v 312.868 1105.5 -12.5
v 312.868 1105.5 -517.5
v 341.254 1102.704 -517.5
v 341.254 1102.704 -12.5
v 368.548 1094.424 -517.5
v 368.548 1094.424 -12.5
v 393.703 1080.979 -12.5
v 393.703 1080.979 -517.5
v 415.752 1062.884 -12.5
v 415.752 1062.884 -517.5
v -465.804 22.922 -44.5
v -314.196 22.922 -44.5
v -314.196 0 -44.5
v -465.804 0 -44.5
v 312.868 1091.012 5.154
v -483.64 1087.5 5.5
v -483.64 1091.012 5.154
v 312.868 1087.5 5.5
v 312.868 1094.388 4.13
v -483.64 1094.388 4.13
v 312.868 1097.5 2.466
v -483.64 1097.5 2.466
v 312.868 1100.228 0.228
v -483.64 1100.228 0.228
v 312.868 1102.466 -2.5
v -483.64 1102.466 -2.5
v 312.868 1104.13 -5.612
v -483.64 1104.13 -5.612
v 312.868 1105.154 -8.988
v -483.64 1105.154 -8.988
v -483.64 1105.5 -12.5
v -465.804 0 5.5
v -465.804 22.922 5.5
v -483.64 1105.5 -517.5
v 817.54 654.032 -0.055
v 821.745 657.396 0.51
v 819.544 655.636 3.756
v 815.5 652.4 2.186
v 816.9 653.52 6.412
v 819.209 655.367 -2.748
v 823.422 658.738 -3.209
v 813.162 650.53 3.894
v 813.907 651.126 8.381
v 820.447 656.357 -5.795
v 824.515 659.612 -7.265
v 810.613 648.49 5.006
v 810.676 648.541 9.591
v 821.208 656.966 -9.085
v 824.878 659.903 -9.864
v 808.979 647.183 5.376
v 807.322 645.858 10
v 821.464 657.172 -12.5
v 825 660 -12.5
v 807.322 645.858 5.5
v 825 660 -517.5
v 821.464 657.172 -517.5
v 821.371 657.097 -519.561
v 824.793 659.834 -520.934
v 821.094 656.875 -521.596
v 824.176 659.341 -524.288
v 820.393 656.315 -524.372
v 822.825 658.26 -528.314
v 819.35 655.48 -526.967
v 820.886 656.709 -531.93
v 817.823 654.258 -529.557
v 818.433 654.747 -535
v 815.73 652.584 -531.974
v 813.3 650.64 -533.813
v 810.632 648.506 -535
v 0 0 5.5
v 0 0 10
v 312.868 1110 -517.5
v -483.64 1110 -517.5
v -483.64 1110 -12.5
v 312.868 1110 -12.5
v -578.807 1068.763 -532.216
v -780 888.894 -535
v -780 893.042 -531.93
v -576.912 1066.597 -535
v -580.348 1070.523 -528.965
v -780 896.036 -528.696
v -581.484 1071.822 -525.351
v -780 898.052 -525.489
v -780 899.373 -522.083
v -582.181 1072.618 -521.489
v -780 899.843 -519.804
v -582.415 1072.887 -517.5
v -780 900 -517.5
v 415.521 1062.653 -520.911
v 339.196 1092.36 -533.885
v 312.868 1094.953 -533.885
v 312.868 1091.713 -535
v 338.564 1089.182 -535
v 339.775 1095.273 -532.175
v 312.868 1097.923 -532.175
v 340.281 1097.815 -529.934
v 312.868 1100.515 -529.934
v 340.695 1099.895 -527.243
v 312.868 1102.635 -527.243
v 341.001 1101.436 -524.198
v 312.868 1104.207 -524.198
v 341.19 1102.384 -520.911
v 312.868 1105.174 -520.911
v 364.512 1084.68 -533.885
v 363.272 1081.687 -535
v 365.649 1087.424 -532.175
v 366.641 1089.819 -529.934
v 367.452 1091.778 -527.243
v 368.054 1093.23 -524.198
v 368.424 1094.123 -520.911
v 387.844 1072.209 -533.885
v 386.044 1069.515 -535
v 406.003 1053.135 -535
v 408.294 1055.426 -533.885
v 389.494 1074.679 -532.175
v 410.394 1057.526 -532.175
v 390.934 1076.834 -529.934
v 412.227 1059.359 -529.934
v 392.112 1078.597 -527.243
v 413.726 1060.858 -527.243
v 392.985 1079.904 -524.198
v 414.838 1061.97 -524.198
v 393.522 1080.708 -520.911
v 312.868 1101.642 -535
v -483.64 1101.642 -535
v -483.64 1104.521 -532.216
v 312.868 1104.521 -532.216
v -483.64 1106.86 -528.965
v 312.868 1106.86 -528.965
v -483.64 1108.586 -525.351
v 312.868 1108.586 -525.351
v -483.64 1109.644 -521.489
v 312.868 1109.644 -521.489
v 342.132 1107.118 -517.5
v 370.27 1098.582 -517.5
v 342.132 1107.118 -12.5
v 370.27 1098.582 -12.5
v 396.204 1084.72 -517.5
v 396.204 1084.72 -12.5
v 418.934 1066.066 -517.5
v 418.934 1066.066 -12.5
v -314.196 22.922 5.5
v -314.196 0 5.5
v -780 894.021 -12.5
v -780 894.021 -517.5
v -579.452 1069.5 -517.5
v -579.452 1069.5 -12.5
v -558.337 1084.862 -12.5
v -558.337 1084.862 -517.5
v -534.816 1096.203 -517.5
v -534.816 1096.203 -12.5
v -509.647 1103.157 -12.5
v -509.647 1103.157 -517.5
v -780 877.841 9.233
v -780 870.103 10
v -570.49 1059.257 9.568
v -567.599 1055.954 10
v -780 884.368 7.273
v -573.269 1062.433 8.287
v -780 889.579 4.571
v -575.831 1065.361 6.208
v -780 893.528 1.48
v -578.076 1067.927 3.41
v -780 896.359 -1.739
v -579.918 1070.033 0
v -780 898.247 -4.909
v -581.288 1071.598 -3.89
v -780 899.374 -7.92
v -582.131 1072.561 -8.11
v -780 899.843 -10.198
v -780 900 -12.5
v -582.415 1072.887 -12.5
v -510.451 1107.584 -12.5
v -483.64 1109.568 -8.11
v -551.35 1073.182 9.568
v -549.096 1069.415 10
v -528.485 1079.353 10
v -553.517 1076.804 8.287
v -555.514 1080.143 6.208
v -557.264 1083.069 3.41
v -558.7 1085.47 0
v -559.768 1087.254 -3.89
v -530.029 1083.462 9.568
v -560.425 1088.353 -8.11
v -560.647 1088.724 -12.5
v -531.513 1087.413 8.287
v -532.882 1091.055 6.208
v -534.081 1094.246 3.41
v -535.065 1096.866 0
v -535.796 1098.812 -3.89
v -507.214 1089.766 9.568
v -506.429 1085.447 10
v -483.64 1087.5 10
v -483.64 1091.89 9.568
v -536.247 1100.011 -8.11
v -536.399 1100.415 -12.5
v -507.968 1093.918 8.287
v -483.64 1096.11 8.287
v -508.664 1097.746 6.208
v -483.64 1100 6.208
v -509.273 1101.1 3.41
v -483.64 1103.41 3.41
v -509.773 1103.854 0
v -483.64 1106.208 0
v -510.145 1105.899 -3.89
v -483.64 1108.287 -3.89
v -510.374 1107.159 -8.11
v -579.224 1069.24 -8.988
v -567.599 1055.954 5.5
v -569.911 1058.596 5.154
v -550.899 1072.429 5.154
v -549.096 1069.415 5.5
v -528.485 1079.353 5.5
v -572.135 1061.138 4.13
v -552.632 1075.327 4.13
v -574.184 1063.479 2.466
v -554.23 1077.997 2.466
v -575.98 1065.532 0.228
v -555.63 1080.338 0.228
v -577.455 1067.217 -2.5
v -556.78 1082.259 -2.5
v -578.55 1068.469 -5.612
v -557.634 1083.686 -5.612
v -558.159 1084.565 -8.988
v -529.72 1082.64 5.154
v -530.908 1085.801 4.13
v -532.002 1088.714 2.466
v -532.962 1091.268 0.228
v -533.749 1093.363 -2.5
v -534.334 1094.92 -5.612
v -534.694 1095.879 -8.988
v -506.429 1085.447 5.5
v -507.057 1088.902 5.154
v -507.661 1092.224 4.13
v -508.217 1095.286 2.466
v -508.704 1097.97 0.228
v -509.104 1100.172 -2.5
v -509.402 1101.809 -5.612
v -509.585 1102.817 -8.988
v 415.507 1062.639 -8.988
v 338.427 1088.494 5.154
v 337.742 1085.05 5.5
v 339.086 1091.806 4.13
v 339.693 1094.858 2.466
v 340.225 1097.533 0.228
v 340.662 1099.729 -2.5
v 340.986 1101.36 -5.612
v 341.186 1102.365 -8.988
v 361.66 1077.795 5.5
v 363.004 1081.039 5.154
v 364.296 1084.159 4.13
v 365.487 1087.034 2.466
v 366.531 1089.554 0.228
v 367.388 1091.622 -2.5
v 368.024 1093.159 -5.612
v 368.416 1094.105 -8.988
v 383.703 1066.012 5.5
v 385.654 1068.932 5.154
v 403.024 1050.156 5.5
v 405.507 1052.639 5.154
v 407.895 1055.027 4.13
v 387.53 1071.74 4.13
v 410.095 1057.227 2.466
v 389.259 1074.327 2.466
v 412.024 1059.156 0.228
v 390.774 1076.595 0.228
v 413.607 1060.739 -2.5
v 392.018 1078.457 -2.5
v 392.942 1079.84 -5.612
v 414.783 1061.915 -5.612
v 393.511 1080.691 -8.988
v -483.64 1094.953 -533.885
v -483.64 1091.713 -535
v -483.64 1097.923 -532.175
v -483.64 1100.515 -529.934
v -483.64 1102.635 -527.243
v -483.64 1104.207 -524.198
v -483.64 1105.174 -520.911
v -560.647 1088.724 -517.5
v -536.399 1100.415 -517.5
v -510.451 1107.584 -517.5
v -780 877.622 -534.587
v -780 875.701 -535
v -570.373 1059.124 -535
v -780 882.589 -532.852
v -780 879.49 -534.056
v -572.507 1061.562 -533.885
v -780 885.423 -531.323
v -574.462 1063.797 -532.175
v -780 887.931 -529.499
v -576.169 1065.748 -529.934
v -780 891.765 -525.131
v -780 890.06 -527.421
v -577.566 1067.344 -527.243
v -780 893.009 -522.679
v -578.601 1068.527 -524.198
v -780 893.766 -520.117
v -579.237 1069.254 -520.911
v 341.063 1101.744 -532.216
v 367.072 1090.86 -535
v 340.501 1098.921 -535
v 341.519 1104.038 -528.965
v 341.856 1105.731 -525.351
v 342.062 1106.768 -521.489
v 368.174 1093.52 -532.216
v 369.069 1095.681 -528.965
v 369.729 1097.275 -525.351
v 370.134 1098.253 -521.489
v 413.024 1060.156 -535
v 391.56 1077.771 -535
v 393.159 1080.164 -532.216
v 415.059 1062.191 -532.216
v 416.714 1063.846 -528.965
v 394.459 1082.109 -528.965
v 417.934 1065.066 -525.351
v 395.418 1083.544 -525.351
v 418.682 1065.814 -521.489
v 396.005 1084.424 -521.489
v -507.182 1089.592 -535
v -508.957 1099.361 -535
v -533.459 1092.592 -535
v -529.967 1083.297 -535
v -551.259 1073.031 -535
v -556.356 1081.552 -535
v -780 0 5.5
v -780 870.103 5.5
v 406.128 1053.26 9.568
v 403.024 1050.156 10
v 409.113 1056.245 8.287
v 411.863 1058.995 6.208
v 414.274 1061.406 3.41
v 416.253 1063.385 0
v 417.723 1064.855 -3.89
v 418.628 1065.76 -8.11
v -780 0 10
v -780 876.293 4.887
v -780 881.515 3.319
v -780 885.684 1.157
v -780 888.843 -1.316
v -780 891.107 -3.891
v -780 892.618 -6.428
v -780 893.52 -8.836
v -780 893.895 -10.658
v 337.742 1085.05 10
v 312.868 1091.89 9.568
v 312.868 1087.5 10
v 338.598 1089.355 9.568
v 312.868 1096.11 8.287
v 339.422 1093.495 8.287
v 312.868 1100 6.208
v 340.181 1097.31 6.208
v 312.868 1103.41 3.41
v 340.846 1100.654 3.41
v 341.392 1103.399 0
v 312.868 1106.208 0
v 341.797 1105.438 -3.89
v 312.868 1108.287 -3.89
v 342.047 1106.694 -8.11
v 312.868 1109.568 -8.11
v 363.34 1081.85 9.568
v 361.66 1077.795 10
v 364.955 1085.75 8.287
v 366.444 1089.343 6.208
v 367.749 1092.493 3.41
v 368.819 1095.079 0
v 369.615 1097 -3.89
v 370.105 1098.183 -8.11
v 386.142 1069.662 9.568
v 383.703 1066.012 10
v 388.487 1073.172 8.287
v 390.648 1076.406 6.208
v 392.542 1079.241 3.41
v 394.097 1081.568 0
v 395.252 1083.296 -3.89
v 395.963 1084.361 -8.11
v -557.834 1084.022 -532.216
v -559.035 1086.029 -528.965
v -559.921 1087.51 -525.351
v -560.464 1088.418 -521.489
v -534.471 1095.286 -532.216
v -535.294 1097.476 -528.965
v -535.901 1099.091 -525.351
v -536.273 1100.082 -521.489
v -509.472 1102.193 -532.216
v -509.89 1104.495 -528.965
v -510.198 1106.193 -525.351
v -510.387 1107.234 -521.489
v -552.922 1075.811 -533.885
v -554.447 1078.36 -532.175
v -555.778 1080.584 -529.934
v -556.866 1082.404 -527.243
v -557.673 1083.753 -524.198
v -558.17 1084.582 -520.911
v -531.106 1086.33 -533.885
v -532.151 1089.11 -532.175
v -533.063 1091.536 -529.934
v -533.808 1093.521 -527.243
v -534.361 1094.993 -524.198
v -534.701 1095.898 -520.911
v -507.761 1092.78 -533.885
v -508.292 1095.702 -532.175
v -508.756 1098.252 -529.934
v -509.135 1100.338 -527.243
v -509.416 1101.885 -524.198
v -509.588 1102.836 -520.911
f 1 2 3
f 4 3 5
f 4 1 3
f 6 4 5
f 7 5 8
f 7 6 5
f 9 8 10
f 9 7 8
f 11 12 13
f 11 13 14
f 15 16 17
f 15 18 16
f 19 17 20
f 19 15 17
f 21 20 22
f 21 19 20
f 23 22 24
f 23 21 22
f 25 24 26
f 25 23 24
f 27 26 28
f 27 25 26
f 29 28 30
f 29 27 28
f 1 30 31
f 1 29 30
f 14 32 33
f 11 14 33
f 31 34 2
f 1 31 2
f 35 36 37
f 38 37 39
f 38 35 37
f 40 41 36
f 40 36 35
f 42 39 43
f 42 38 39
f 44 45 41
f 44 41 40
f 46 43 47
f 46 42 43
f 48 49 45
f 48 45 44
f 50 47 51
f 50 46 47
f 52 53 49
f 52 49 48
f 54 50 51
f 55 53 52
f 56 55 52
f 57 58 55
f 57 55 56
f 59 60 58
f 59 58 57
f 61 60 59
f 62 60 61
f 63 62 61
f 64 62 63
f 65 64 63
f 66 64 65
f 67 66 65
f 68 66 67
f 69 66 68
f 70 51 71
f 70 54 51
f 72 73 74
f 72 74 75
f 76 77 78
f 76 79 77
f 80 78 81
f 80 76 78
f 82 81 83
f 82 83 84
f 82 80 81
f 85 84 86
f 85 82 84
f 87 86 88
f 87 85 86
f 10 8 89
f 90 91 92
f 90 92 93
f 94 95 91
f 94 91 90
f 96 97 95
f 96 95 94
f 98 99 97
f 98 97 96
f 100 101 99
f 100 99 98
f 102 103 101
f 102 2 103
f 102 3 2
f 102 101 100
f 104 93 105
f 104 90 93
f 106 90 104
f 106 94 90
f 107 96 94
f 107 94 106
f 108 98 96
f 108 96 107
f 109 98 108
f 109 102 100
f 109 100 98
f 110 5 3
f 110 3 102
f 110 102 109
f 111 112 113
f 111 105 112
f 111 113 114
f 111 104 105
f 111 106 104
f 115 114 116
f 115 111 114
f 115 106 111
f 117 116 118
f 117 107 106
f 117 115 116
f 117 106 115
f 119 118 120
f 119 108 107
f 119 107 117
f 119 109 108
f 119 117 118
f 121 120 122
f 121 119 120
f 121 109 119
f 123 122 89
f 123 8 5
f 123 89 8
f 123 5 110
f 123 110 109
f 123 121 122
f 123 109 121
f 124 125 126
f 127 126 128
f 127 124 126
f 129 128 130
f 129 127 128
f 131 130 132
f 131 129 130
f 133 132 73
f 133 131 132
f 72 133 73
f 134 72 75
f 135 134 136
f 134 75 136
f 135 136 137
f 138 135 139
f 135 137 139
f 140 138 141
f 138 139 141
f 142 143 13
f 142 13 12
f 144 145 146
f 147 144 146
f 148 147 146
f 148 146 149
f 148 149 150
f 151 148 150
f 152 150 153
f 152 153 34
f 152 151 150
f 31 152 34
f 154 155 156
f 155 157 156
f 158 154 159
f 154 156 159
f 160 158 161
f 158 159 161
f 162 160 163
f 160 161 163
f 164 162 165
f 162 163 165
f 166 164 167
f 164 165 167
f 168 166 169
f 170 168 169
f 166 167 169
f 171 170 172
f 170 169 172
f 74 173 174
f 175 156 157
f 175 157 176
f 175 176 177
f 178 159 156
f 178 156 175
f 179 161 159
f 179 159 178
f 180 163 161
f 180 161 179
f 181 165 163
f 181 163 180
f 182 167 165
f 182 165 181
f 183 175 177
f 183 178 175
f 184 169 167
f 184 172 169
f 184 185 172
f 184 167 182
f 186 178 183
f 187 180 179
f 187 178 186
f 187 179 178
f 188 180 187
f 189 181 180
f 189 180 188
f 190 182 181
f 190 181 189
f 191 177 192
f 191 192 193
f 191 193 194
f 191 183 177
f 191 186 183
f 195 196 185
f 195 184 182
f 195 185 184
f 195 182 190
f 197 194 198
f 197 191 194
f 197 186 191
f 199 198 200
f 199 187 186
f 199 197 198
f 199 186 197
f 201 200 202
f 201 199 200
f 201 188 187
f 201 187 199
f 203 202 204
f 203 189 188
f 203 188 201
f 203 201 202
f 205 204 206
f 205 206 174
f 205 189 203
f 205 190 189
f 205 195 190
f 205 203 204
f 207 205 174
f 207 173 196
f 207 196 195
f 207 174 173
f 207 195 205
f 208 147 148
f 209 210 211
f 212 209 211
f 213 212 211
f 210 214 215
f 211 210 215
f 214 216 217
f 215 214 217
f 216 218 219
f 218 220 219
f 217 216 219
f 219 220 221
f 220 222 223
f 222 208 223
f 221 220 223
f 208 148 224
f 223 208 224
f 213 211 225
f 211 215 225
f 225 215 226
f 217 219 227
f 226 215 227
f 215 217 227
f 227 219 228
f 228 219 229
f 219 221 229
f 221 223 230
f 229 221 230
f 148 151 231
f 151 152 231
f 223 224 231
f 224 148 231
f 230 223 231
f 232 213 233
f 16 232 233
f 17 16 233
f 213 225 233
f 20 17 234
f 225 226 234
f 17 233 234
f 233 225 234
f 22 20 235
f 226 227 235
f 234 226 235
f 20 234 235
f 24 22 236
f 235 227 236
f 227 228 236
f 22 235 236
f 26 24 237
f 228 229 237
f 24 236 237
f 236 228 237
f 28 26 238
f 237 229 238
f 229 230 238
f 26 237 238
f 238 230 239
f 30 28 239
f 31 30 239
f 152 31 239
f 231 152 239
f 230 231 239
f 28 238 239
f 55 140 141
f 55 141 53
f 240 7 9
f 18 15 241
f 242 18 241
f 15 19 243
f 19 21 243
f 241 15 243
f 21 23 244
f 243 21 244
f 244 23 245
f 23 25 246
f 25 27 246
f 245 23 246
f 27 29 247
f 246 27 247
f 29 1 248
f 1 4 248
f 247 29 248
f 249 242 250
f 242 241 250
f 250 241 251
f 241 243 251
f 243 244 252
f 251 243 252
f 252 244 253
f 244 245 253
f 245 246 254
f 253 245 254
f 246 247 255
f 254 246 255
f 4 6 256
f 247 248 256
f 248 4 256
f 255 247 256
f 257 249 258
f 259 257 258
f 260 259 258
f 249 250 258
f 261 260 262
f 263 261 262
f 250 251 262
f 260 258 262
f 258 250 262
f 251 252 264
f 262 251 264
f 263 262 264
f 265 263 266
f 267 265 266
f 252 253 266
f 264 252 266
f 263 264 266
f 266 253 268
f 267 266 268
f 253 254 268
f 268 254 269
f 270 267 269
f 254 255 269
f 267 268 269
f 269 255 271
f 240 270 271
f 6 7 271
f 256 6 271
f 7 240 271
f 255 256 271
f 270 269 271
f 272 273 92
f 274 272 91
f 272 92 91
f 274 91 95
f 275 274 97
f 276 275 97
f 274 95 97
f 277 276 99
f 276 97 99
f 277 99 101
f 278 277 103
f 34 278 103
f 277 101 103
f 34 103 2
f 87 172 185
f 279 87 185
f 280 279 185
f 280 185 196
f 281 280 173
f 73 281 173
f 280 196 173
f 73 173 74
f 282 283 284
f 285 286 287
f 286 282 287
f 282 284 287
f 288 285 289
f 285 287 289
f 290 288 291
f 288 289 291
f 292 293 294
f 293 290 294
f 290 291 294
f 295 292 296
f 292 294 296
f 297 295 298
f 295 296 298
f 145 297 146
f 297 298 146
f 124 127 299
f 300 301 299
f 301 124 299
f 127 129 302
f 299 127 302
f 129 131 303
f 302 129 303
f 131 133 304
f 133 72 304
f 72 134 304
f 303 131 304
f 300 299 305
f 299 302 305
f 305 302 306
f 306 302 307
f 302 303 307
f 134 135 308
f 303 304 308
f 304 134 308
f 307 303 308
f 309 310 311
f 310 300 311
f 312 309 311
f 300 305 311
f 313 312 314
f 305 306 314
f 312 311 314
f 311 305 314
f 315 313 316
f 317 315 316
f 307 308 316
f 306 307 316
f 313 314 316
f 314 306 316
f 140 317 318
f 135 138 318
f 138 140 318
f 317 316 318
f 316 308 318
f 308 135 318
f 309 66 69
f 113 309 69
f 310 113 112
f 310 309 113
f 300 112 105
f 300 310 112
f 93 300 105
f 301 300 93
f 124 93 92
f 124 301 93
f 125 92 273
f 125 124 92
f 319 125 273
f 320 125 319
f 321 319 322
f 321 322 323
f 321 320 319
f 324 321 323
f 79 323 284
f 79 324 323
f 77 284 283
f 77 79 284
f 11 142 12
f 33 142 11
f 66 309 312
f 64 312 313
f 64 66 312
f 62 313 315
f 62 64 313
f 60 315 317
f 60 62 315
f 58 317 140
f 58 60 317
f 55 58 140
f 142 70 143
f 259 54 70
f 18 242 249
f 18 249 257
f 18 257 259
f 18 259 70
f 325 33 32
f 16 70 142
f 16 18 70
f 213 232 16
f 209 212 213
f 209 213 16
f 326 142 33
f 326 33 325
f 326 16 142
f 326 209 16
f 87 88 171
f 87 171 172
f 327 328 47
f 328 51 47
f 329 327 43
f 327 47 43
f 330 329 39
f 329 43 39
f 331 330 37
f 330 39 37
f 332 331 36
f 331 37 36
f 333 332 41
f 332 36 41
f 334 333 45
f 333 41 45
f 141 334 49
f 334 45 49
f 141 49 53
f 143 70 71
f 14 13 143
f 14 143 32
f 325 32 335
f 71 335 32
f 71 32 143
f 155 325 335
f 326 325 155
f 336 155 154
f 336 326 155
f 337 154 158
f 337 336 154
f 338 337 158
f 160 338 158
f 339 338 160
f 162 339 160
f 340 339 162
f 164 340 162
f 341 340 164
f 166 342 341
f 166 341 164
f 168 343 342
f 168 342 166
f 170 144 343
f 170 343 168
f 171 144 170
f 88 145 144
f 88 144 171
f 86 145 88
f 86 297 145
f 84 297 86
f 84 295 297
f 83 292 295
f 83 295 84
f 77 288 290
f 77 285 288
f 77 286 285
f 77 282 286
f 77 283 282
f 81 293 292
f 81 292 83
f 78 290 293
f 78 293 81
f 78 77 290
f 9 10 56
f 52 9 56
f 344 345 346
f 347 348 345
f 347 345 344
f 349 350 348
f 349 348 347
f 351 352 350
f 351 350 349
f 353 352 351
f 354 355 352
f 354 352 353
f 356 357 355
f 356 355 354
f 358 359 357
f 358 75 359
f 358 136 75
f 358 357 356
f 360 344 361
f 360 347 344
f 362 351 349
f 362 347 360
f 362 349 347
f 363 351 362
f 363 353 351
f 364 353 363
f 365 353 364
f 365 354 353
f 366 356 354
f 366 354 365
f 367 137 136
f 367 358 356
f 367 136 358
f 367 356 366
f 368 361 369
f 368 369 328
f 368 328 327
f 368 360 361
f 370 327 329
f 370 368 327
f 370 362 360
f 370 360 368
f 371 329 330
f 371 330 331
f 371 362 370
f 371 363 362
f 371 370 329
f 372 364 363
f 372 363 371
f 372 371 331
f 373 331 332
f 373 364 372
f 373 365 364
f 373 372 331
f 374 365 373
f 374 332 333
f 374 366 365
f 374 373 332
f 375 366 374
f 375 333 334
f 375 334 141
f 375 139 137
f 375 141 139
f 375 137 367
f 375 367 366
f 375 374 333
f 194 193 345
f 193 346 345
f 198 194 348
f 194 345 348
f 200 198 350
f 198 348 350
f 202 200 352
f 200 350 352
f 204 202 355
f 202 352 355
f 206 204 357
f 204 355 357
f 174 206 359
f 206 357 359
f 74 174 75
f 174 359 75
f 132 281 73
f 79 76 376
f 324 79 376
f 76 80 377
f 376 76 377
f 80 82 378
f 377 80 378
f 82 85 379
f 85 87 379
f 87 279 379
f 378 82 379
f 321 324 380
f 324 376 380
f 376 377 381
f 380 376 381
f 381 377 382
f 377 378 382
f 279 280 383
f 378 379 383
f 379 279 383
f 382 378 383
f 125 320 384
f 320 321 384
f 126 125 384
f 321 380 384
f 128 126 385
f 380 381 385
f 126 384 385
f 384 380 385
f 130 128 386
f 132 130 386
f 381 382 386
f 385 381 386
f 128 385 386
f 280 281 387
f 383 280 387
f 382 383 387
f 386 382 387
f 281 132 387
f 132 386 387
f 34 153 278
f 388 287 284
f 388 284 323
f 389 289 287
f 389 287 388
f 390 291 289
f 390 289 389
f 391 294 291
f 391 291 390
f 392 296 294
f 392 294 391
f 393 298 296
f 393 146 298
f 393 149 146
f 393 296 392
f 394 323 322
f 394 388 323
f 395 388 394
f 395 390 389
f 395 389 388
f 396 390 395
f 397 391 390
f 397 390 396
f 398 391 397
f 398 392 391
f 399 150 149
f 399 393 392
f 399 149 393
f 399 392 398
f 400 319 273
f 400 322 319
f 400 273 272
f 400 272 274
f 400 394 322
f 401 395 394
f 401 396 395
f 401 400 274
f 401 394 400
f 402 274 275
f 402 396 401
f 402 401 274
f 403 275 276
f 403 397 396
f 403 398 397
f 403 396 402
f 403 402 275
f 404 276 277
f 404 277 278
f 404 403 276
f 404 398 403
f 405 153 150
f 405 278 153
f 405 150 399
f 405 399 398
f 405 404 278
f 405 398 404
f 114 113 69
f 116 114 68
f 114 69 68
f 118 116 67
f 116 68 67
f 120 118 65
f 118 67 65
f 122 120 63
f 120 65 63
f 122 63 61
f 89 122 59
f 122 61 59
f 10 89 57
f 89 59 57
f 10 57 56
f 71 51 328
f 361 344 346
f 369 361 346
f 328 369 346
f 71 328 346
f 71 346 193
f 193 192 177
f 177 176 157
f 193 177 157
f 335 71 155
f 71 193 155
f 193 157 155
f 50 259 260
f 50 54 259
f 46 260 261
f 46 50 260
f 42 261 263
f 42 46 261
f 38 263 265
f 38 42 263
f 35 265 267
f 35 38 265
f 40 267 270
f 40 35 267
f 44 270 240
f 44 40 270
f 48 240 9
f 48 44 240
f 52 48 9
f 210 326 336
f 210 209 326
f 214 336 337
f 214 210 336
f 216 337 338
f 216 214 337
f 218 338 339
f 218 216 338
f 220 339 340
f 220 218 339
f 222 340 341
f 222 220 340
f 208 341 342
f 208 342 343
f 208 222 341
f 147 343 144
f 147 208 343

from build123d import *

# Parameters (mm, degrees)
BOSS_EXTRUDE1_DEPTH      = 10
BOSS_EXTRUDE1_DEPTH_BACK = 540
FILLET1_R                = 150
FILLET2_R                = 22.5
SHELL1_T                 = -4.5
CUT_EXTRUDE1_START       = -535
CUT_EXTRUDE1_DEPTH       = 79
SKETCH2_W                = 151.608609382
SKETCH2_H                = 22.921634695
BOSS_EXTRUDE2_DEPTH      = 50


with BuildPart() as part:
    # Sketch1 → Boss-Extrude1 (new, two sides: drawn at the far end of the back side and taken through both)
    with BuildSketch(Plane.XY.offset(-BOSS_EXTRUDE1_DEPTH_BACK)):
        Polygon((0, 0), (-780, 0), (-780, 900), (-540, 1110), (375, 1110), (825, 660), align=None)
    extrude(amount=BOSS_EXTRUDE1_DEPTH + BOSS_EXTRUDE1_DEPTH_BACK)

    # Fillet1
    fillet1_edges = [part.edges().sort_by_distance(p)[0] for p in [
        (-540, 1110, -265),
        (375, 1110, -265),
    ]]
    fillet(fillet1_edges, radius=FILLET1_R)

    # Fillet2
    fillet2_edges = [part.edges().sort_by_distance(p)[0] for p in [
        (621.966991411, 863.033008589, -540),
        (-85.38588347, 1110, -540),
        (-85.38588347, 1110, 10),
        (-681.207711882, 986.443252103, -540),
        (-536.398733566, 1100.415411602, -540),
        (370.270480499, 1098.581929877, -540),
        (-681.207711882, 986.443252103, 10),
        (-536.398733566, 1100.415411602, 10),
        (370.270480499, 1098.581929877, 10),
        (621.966991411, 863.033008589, 10),
    ]]
    fillet(fillet2_edges, radius=FILLET2_R)

    # Shell1
    shell1_openings = [part.faces().sort_by_distance(p)[0] for p in [
        (-390, 0, -265),
        (-780, 449.741271018, -265),
        (412.346232546, 329.876986037, -265),
    ]]
    offset(amount=SHELL1_T, openings=shell1_openings)

    # Sketch1<2> → Cut-Extrude1 (cut)
    with BuildSketch(Plane.XY.offset(CUT_EXTRUDE1_START)):
        Polygon((0, 0), (-780, 0), (-780, 900), (-540, 1110), (375, 1110), (825, 660), align=None)
    extrude(amount=-CUT_EXTRUDE1_DEPTH, mode=Mode.SUBTRACT)

    # Sketch2 → Boss-Extrude2 (add)
    with BuildSketch(Plane(origin=(0, 0, 5.5), x_dir=(-1, 0, 0), z_dir=(0, 0, -1))):
        with Locations((390, 11.460817348)):
            Rectangle(SKETCH2_W, SKETCH2_H)
    extrude(amount=BOSS_EXTRUDE2_DEPTH)


solid = part.part
